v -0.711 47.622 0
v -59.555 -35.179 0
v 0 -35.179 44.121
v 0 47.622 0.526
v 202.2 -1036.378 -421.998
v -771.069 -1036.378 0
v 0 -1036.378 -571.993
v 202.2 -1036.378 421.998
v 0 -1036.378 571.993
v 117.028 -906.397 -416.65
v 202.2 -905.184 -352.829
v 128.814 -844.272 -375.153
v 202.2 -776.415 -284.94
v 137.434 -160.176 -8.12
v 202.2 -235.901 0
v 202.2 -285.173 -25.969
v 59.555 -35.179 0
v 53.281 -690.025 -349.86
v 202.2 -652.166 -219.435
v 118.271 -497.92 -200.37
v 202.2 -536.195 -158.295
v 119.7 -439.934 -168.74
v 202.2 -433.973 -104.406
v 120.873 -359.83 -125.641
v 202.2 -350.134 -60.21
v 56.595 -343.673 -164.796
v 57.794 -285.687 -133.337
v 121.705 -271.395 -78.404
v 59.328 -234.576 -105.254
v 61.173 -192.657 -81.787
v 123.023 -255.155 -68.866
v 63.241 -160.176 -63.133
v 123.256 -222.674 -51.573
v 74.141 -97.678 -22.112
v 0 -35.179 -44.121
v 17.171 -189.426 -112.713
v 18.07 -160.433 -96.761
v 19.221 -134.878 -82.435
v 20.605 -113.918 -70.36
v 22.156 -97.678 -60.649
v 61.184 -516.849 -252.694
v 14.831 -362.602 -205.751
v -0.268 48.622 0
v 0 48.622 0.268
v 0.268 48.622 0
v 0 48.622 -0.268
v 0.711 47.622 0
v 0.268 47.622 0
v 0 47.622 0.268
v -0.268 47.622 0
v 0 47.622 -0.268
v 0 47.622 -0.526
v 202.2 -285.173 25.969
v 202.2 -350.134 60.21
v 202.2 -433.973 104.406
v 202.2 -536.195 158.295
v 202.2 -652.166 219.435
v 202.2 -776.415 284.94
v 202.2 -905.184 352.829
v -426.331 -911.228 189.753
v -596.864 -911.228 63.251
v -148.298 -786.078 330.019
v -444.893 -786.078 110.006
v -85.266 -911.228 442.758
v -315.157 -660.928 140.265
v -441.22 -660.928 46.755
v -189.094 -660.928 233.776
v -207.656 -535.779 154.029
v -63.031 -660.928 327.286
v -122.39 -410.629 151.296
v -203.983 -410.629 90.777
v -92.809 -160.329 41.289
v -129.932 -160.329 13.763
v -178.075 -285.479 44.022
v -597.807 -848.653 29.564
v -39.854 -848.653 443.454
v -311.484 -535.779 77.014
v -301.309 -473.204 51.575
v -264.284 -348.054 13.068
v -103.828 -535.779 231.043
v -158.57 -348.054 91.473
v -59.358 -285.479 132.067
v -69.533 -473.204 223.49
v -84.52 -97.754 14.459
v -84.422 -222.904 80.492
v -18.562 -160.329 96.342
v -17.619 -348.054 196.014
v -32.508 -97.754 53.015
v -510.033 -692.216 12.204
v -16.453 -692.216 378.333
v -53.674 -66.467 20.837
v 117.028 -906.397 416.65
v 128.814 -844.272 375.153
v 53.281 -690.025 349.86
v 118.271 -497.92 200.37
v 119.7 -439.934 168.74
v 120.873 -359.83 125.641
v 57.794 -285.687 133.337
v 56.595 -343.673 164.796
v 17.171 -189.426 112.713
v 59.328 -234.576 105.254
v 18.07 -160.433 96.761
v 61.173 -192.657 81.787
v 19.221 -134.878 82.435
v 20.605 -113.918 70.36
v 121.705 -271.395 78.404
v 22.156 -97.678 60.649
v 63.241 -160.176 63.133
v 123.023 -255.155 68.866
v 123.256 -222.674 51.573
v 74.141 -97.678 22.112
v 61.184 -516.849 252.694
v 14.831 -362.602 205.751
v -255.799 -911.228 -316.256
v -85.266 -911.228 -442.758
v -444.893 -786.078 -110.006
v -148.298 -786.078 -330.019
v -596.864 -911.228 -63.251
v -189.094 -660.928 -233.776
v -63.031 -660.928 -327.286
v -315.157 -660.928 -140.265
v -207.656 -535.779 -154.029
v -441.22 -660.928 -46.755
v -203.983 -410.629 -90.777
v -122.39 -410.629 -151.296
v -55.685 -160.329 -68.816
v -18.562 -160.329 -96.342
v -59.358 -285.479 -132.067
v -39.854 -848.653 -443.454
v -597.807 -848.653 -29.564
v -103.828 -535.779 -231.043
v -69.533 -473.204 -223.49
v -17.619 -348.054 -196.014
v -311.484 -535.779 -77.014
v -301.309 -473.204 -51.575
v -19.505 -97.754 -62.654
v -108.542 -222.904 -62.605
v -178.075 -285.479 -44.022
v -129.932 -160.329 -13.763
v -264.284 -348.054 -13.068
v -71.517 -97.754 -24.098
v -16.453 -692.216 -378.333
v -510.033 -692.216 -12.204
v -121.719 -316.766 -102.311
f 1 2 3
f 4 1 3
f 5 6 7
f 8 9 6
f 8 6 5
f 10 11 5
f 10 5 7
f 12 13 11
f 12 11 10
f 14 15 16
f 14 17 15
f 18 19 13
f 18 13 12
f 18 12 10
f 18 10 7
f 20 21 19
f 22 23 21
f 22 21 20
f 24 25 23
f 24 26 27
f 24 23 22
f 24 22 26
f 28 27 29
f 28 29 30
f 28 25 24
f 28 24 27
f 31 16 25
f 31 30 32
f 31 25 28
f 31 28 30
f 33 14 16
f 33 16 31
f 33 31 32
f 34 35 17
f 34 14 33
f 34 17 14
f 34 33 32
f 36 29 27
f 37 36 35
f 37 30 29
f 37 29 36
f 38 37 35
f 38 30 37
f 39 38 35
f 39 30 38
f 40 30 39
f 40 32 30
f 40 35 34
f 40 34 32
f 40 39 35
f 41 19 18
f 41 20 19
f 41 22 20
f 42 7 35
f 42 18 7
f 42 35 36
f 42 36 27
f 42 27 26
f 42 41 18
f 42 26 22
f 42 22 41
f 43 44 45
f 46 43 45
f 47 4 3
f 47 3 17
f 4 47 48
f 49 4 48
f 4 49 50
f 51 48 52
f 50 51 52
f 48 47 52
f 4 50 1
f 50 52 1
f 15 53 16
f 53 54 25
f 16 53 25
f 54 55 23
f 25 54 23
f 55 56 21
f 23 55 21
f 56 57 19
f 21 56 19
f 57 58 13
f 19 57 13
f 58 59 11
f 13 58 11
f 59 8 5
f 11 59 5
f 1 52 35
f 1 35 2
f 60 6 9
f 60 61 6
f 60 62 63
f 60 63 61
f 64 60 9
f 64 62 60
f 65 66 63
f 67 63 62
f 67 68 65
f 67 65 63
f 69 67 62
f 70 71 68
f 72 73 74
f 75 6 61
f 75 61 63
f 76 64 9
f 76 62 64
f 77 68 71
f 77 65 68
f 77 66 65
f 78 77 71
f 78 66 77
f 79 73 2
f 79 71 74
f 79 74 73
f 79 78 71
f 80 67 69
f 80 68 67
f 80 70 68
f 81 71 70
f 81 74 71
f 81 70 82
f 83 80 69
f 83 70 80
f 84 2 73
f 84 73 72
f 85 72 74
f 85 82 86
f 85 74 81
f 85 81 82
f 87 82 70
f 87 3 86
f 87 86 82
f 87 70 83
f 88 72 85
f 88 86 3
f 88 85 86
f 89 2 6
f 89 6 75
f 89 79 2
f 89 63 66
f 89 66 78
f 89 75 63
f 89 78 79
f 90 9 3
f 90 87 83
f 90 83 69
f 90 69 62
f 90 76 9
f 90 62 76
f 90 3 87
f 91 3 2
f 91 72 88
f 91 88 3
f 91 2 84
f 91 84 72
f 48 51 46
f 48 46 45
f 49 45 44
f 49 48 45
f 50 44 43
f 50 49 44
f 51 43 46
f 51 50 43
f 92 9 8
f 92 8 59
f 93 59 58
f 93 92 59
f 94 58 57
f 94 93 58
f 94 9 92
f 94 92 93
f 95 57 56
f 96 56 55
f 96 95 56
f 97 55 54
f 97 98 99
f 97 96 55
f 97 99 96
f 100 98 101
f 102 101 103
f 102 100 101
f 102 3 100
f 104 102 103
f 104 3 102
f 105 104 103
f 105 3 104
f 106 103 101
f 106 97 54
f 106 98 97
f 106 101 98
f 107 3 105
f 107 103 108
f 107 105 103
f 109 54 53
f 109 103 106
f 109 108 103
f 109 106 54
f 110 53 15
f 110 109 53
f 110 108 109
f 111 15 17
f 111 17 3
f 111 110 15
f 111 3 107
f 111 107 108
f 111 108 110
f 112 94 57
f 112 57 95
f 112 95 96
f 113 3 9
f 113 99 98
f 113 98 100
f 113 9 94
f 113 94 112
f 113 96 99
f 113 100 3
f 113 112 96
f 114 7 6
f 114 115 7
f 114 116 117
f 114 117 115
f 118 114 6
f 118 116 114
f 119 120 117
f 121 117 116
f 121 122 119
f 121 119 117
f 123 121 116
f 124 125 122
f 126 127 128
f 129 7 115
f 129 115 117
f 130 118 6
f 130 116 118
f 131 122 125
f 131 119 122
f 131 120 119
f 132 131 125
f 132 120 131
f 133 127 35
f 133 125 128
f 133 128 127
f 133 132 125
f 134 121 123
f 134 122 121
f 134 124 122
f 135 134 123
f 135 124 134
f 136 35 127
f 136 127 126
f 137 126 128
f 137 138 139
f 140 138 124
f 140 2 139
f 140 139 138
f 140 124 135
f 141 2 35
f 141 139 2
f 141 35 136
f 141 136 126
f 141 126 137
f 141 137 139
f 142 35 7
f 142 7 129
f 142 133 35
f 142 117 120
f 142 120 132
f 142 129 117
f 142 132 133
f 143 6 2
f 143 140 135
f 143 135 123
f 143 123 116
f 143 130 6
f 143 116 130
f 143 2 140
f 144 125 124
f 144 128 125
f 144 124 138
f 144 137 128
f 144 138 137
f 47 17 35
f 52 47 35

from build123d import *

# Parameters (mm, degrees)
CUT_EXTRUDE_1_DEPTH = 10
SKETCH_8_R          = 0.268132752
EXTRUDE_2_DEPTH     = 1
CUT_EXTRUDE_2_DEPTH = 1449.775057994


with BuildPart() as part:
    # 草图4 → 放样9 section 0
    with BuildSketch(Plane(origin=(0, -35.179389088, 0), x_dir=(-1, 0, 0), z_dir=(0, -1, 0)), mode=Mode.PRIVATE) as loft_9_s0:
        with BuildLine():
            Line((0, 44.121114102), (59.554648117, 0))
            Line((59.554648117, 0), (0, -44.121114102))
            Line((0, -44.121114102), (-59.554648117, 0))
            Line((-59.554648117, 0), (0, 44.121114102))
        make_face()
    loft([loft_9_s0.sketch, Vertex(0, 48.62214178, 0)])

    # 草图7 → 切除-拉伸1 (cut)
    with BuildSketch(Plane(origin=(0, 47.62214178, 0), x_dir=(-1, 0, 0), z_dir=(0, -1, 0))):
        Polygon((0, -44.121114102), (59.554648117, 0), (0, 44.121114102), (-59.554648117, 0), align=None)
    extrude(amount=-CUT_EXTRUDE_1_DEPTH, mode=Mode.SUBTRACT)

    # 草图8 → 凸台-拉伸2 (add)
    with BuildSketch(Plane(origin=(0, 47.62214178, 0), x_dir=(-1, 0, 0), z_dir=(0, -1, 0))):
        with Locations(Location((0, 0, 0), (0, 0, 90))):
            Circle(SKETCH_8_R)
    extrude(amount=-EXTRUDE_2_DEPTH)

    # 草图9 → section 0 of loft_10
    with BuildSketch(Plane(origin=(0, -1036.37785822, 0), x_dir=(-1, 0, 0), z_dir=(0, -1, 0)), mode=Mode.PRIVATE) as loft_10_s0:
        with BuildLine():
            Line((771.069365179, 0), (0, -571.993183946))
            Line((0, -571.993183946), (-771.069365179, 0))
            Line((-771.069365179, 0), (0, 571.993183946))
            Line((0, 571.993183946), (771.069365179, 0))
        make_face()
    # loft up to a face of the part (loft_10)
    loft([loft_10_s0.sketch, part.faces().sort_by_distance((0, -35.179389088, 0))[0]])

    # 草图10 → 切除-拉伸2 (cut, through all)
    with BuildSketch(Plane(origin=(0, -1036.37785822, 0), x_dir=(-1, 0, 0), z_dir=(0, -1, 0))):
        Polygon((-202.2, 0), (-202.2, 421.997571337), (-771.069365179, 0), (-202.2, -421.997571337), align=None)
    extrude(amount=-CUT_EXTRUDE_2_DEPTH, mode=Mode.SUBTRACT)


solid = part.part
